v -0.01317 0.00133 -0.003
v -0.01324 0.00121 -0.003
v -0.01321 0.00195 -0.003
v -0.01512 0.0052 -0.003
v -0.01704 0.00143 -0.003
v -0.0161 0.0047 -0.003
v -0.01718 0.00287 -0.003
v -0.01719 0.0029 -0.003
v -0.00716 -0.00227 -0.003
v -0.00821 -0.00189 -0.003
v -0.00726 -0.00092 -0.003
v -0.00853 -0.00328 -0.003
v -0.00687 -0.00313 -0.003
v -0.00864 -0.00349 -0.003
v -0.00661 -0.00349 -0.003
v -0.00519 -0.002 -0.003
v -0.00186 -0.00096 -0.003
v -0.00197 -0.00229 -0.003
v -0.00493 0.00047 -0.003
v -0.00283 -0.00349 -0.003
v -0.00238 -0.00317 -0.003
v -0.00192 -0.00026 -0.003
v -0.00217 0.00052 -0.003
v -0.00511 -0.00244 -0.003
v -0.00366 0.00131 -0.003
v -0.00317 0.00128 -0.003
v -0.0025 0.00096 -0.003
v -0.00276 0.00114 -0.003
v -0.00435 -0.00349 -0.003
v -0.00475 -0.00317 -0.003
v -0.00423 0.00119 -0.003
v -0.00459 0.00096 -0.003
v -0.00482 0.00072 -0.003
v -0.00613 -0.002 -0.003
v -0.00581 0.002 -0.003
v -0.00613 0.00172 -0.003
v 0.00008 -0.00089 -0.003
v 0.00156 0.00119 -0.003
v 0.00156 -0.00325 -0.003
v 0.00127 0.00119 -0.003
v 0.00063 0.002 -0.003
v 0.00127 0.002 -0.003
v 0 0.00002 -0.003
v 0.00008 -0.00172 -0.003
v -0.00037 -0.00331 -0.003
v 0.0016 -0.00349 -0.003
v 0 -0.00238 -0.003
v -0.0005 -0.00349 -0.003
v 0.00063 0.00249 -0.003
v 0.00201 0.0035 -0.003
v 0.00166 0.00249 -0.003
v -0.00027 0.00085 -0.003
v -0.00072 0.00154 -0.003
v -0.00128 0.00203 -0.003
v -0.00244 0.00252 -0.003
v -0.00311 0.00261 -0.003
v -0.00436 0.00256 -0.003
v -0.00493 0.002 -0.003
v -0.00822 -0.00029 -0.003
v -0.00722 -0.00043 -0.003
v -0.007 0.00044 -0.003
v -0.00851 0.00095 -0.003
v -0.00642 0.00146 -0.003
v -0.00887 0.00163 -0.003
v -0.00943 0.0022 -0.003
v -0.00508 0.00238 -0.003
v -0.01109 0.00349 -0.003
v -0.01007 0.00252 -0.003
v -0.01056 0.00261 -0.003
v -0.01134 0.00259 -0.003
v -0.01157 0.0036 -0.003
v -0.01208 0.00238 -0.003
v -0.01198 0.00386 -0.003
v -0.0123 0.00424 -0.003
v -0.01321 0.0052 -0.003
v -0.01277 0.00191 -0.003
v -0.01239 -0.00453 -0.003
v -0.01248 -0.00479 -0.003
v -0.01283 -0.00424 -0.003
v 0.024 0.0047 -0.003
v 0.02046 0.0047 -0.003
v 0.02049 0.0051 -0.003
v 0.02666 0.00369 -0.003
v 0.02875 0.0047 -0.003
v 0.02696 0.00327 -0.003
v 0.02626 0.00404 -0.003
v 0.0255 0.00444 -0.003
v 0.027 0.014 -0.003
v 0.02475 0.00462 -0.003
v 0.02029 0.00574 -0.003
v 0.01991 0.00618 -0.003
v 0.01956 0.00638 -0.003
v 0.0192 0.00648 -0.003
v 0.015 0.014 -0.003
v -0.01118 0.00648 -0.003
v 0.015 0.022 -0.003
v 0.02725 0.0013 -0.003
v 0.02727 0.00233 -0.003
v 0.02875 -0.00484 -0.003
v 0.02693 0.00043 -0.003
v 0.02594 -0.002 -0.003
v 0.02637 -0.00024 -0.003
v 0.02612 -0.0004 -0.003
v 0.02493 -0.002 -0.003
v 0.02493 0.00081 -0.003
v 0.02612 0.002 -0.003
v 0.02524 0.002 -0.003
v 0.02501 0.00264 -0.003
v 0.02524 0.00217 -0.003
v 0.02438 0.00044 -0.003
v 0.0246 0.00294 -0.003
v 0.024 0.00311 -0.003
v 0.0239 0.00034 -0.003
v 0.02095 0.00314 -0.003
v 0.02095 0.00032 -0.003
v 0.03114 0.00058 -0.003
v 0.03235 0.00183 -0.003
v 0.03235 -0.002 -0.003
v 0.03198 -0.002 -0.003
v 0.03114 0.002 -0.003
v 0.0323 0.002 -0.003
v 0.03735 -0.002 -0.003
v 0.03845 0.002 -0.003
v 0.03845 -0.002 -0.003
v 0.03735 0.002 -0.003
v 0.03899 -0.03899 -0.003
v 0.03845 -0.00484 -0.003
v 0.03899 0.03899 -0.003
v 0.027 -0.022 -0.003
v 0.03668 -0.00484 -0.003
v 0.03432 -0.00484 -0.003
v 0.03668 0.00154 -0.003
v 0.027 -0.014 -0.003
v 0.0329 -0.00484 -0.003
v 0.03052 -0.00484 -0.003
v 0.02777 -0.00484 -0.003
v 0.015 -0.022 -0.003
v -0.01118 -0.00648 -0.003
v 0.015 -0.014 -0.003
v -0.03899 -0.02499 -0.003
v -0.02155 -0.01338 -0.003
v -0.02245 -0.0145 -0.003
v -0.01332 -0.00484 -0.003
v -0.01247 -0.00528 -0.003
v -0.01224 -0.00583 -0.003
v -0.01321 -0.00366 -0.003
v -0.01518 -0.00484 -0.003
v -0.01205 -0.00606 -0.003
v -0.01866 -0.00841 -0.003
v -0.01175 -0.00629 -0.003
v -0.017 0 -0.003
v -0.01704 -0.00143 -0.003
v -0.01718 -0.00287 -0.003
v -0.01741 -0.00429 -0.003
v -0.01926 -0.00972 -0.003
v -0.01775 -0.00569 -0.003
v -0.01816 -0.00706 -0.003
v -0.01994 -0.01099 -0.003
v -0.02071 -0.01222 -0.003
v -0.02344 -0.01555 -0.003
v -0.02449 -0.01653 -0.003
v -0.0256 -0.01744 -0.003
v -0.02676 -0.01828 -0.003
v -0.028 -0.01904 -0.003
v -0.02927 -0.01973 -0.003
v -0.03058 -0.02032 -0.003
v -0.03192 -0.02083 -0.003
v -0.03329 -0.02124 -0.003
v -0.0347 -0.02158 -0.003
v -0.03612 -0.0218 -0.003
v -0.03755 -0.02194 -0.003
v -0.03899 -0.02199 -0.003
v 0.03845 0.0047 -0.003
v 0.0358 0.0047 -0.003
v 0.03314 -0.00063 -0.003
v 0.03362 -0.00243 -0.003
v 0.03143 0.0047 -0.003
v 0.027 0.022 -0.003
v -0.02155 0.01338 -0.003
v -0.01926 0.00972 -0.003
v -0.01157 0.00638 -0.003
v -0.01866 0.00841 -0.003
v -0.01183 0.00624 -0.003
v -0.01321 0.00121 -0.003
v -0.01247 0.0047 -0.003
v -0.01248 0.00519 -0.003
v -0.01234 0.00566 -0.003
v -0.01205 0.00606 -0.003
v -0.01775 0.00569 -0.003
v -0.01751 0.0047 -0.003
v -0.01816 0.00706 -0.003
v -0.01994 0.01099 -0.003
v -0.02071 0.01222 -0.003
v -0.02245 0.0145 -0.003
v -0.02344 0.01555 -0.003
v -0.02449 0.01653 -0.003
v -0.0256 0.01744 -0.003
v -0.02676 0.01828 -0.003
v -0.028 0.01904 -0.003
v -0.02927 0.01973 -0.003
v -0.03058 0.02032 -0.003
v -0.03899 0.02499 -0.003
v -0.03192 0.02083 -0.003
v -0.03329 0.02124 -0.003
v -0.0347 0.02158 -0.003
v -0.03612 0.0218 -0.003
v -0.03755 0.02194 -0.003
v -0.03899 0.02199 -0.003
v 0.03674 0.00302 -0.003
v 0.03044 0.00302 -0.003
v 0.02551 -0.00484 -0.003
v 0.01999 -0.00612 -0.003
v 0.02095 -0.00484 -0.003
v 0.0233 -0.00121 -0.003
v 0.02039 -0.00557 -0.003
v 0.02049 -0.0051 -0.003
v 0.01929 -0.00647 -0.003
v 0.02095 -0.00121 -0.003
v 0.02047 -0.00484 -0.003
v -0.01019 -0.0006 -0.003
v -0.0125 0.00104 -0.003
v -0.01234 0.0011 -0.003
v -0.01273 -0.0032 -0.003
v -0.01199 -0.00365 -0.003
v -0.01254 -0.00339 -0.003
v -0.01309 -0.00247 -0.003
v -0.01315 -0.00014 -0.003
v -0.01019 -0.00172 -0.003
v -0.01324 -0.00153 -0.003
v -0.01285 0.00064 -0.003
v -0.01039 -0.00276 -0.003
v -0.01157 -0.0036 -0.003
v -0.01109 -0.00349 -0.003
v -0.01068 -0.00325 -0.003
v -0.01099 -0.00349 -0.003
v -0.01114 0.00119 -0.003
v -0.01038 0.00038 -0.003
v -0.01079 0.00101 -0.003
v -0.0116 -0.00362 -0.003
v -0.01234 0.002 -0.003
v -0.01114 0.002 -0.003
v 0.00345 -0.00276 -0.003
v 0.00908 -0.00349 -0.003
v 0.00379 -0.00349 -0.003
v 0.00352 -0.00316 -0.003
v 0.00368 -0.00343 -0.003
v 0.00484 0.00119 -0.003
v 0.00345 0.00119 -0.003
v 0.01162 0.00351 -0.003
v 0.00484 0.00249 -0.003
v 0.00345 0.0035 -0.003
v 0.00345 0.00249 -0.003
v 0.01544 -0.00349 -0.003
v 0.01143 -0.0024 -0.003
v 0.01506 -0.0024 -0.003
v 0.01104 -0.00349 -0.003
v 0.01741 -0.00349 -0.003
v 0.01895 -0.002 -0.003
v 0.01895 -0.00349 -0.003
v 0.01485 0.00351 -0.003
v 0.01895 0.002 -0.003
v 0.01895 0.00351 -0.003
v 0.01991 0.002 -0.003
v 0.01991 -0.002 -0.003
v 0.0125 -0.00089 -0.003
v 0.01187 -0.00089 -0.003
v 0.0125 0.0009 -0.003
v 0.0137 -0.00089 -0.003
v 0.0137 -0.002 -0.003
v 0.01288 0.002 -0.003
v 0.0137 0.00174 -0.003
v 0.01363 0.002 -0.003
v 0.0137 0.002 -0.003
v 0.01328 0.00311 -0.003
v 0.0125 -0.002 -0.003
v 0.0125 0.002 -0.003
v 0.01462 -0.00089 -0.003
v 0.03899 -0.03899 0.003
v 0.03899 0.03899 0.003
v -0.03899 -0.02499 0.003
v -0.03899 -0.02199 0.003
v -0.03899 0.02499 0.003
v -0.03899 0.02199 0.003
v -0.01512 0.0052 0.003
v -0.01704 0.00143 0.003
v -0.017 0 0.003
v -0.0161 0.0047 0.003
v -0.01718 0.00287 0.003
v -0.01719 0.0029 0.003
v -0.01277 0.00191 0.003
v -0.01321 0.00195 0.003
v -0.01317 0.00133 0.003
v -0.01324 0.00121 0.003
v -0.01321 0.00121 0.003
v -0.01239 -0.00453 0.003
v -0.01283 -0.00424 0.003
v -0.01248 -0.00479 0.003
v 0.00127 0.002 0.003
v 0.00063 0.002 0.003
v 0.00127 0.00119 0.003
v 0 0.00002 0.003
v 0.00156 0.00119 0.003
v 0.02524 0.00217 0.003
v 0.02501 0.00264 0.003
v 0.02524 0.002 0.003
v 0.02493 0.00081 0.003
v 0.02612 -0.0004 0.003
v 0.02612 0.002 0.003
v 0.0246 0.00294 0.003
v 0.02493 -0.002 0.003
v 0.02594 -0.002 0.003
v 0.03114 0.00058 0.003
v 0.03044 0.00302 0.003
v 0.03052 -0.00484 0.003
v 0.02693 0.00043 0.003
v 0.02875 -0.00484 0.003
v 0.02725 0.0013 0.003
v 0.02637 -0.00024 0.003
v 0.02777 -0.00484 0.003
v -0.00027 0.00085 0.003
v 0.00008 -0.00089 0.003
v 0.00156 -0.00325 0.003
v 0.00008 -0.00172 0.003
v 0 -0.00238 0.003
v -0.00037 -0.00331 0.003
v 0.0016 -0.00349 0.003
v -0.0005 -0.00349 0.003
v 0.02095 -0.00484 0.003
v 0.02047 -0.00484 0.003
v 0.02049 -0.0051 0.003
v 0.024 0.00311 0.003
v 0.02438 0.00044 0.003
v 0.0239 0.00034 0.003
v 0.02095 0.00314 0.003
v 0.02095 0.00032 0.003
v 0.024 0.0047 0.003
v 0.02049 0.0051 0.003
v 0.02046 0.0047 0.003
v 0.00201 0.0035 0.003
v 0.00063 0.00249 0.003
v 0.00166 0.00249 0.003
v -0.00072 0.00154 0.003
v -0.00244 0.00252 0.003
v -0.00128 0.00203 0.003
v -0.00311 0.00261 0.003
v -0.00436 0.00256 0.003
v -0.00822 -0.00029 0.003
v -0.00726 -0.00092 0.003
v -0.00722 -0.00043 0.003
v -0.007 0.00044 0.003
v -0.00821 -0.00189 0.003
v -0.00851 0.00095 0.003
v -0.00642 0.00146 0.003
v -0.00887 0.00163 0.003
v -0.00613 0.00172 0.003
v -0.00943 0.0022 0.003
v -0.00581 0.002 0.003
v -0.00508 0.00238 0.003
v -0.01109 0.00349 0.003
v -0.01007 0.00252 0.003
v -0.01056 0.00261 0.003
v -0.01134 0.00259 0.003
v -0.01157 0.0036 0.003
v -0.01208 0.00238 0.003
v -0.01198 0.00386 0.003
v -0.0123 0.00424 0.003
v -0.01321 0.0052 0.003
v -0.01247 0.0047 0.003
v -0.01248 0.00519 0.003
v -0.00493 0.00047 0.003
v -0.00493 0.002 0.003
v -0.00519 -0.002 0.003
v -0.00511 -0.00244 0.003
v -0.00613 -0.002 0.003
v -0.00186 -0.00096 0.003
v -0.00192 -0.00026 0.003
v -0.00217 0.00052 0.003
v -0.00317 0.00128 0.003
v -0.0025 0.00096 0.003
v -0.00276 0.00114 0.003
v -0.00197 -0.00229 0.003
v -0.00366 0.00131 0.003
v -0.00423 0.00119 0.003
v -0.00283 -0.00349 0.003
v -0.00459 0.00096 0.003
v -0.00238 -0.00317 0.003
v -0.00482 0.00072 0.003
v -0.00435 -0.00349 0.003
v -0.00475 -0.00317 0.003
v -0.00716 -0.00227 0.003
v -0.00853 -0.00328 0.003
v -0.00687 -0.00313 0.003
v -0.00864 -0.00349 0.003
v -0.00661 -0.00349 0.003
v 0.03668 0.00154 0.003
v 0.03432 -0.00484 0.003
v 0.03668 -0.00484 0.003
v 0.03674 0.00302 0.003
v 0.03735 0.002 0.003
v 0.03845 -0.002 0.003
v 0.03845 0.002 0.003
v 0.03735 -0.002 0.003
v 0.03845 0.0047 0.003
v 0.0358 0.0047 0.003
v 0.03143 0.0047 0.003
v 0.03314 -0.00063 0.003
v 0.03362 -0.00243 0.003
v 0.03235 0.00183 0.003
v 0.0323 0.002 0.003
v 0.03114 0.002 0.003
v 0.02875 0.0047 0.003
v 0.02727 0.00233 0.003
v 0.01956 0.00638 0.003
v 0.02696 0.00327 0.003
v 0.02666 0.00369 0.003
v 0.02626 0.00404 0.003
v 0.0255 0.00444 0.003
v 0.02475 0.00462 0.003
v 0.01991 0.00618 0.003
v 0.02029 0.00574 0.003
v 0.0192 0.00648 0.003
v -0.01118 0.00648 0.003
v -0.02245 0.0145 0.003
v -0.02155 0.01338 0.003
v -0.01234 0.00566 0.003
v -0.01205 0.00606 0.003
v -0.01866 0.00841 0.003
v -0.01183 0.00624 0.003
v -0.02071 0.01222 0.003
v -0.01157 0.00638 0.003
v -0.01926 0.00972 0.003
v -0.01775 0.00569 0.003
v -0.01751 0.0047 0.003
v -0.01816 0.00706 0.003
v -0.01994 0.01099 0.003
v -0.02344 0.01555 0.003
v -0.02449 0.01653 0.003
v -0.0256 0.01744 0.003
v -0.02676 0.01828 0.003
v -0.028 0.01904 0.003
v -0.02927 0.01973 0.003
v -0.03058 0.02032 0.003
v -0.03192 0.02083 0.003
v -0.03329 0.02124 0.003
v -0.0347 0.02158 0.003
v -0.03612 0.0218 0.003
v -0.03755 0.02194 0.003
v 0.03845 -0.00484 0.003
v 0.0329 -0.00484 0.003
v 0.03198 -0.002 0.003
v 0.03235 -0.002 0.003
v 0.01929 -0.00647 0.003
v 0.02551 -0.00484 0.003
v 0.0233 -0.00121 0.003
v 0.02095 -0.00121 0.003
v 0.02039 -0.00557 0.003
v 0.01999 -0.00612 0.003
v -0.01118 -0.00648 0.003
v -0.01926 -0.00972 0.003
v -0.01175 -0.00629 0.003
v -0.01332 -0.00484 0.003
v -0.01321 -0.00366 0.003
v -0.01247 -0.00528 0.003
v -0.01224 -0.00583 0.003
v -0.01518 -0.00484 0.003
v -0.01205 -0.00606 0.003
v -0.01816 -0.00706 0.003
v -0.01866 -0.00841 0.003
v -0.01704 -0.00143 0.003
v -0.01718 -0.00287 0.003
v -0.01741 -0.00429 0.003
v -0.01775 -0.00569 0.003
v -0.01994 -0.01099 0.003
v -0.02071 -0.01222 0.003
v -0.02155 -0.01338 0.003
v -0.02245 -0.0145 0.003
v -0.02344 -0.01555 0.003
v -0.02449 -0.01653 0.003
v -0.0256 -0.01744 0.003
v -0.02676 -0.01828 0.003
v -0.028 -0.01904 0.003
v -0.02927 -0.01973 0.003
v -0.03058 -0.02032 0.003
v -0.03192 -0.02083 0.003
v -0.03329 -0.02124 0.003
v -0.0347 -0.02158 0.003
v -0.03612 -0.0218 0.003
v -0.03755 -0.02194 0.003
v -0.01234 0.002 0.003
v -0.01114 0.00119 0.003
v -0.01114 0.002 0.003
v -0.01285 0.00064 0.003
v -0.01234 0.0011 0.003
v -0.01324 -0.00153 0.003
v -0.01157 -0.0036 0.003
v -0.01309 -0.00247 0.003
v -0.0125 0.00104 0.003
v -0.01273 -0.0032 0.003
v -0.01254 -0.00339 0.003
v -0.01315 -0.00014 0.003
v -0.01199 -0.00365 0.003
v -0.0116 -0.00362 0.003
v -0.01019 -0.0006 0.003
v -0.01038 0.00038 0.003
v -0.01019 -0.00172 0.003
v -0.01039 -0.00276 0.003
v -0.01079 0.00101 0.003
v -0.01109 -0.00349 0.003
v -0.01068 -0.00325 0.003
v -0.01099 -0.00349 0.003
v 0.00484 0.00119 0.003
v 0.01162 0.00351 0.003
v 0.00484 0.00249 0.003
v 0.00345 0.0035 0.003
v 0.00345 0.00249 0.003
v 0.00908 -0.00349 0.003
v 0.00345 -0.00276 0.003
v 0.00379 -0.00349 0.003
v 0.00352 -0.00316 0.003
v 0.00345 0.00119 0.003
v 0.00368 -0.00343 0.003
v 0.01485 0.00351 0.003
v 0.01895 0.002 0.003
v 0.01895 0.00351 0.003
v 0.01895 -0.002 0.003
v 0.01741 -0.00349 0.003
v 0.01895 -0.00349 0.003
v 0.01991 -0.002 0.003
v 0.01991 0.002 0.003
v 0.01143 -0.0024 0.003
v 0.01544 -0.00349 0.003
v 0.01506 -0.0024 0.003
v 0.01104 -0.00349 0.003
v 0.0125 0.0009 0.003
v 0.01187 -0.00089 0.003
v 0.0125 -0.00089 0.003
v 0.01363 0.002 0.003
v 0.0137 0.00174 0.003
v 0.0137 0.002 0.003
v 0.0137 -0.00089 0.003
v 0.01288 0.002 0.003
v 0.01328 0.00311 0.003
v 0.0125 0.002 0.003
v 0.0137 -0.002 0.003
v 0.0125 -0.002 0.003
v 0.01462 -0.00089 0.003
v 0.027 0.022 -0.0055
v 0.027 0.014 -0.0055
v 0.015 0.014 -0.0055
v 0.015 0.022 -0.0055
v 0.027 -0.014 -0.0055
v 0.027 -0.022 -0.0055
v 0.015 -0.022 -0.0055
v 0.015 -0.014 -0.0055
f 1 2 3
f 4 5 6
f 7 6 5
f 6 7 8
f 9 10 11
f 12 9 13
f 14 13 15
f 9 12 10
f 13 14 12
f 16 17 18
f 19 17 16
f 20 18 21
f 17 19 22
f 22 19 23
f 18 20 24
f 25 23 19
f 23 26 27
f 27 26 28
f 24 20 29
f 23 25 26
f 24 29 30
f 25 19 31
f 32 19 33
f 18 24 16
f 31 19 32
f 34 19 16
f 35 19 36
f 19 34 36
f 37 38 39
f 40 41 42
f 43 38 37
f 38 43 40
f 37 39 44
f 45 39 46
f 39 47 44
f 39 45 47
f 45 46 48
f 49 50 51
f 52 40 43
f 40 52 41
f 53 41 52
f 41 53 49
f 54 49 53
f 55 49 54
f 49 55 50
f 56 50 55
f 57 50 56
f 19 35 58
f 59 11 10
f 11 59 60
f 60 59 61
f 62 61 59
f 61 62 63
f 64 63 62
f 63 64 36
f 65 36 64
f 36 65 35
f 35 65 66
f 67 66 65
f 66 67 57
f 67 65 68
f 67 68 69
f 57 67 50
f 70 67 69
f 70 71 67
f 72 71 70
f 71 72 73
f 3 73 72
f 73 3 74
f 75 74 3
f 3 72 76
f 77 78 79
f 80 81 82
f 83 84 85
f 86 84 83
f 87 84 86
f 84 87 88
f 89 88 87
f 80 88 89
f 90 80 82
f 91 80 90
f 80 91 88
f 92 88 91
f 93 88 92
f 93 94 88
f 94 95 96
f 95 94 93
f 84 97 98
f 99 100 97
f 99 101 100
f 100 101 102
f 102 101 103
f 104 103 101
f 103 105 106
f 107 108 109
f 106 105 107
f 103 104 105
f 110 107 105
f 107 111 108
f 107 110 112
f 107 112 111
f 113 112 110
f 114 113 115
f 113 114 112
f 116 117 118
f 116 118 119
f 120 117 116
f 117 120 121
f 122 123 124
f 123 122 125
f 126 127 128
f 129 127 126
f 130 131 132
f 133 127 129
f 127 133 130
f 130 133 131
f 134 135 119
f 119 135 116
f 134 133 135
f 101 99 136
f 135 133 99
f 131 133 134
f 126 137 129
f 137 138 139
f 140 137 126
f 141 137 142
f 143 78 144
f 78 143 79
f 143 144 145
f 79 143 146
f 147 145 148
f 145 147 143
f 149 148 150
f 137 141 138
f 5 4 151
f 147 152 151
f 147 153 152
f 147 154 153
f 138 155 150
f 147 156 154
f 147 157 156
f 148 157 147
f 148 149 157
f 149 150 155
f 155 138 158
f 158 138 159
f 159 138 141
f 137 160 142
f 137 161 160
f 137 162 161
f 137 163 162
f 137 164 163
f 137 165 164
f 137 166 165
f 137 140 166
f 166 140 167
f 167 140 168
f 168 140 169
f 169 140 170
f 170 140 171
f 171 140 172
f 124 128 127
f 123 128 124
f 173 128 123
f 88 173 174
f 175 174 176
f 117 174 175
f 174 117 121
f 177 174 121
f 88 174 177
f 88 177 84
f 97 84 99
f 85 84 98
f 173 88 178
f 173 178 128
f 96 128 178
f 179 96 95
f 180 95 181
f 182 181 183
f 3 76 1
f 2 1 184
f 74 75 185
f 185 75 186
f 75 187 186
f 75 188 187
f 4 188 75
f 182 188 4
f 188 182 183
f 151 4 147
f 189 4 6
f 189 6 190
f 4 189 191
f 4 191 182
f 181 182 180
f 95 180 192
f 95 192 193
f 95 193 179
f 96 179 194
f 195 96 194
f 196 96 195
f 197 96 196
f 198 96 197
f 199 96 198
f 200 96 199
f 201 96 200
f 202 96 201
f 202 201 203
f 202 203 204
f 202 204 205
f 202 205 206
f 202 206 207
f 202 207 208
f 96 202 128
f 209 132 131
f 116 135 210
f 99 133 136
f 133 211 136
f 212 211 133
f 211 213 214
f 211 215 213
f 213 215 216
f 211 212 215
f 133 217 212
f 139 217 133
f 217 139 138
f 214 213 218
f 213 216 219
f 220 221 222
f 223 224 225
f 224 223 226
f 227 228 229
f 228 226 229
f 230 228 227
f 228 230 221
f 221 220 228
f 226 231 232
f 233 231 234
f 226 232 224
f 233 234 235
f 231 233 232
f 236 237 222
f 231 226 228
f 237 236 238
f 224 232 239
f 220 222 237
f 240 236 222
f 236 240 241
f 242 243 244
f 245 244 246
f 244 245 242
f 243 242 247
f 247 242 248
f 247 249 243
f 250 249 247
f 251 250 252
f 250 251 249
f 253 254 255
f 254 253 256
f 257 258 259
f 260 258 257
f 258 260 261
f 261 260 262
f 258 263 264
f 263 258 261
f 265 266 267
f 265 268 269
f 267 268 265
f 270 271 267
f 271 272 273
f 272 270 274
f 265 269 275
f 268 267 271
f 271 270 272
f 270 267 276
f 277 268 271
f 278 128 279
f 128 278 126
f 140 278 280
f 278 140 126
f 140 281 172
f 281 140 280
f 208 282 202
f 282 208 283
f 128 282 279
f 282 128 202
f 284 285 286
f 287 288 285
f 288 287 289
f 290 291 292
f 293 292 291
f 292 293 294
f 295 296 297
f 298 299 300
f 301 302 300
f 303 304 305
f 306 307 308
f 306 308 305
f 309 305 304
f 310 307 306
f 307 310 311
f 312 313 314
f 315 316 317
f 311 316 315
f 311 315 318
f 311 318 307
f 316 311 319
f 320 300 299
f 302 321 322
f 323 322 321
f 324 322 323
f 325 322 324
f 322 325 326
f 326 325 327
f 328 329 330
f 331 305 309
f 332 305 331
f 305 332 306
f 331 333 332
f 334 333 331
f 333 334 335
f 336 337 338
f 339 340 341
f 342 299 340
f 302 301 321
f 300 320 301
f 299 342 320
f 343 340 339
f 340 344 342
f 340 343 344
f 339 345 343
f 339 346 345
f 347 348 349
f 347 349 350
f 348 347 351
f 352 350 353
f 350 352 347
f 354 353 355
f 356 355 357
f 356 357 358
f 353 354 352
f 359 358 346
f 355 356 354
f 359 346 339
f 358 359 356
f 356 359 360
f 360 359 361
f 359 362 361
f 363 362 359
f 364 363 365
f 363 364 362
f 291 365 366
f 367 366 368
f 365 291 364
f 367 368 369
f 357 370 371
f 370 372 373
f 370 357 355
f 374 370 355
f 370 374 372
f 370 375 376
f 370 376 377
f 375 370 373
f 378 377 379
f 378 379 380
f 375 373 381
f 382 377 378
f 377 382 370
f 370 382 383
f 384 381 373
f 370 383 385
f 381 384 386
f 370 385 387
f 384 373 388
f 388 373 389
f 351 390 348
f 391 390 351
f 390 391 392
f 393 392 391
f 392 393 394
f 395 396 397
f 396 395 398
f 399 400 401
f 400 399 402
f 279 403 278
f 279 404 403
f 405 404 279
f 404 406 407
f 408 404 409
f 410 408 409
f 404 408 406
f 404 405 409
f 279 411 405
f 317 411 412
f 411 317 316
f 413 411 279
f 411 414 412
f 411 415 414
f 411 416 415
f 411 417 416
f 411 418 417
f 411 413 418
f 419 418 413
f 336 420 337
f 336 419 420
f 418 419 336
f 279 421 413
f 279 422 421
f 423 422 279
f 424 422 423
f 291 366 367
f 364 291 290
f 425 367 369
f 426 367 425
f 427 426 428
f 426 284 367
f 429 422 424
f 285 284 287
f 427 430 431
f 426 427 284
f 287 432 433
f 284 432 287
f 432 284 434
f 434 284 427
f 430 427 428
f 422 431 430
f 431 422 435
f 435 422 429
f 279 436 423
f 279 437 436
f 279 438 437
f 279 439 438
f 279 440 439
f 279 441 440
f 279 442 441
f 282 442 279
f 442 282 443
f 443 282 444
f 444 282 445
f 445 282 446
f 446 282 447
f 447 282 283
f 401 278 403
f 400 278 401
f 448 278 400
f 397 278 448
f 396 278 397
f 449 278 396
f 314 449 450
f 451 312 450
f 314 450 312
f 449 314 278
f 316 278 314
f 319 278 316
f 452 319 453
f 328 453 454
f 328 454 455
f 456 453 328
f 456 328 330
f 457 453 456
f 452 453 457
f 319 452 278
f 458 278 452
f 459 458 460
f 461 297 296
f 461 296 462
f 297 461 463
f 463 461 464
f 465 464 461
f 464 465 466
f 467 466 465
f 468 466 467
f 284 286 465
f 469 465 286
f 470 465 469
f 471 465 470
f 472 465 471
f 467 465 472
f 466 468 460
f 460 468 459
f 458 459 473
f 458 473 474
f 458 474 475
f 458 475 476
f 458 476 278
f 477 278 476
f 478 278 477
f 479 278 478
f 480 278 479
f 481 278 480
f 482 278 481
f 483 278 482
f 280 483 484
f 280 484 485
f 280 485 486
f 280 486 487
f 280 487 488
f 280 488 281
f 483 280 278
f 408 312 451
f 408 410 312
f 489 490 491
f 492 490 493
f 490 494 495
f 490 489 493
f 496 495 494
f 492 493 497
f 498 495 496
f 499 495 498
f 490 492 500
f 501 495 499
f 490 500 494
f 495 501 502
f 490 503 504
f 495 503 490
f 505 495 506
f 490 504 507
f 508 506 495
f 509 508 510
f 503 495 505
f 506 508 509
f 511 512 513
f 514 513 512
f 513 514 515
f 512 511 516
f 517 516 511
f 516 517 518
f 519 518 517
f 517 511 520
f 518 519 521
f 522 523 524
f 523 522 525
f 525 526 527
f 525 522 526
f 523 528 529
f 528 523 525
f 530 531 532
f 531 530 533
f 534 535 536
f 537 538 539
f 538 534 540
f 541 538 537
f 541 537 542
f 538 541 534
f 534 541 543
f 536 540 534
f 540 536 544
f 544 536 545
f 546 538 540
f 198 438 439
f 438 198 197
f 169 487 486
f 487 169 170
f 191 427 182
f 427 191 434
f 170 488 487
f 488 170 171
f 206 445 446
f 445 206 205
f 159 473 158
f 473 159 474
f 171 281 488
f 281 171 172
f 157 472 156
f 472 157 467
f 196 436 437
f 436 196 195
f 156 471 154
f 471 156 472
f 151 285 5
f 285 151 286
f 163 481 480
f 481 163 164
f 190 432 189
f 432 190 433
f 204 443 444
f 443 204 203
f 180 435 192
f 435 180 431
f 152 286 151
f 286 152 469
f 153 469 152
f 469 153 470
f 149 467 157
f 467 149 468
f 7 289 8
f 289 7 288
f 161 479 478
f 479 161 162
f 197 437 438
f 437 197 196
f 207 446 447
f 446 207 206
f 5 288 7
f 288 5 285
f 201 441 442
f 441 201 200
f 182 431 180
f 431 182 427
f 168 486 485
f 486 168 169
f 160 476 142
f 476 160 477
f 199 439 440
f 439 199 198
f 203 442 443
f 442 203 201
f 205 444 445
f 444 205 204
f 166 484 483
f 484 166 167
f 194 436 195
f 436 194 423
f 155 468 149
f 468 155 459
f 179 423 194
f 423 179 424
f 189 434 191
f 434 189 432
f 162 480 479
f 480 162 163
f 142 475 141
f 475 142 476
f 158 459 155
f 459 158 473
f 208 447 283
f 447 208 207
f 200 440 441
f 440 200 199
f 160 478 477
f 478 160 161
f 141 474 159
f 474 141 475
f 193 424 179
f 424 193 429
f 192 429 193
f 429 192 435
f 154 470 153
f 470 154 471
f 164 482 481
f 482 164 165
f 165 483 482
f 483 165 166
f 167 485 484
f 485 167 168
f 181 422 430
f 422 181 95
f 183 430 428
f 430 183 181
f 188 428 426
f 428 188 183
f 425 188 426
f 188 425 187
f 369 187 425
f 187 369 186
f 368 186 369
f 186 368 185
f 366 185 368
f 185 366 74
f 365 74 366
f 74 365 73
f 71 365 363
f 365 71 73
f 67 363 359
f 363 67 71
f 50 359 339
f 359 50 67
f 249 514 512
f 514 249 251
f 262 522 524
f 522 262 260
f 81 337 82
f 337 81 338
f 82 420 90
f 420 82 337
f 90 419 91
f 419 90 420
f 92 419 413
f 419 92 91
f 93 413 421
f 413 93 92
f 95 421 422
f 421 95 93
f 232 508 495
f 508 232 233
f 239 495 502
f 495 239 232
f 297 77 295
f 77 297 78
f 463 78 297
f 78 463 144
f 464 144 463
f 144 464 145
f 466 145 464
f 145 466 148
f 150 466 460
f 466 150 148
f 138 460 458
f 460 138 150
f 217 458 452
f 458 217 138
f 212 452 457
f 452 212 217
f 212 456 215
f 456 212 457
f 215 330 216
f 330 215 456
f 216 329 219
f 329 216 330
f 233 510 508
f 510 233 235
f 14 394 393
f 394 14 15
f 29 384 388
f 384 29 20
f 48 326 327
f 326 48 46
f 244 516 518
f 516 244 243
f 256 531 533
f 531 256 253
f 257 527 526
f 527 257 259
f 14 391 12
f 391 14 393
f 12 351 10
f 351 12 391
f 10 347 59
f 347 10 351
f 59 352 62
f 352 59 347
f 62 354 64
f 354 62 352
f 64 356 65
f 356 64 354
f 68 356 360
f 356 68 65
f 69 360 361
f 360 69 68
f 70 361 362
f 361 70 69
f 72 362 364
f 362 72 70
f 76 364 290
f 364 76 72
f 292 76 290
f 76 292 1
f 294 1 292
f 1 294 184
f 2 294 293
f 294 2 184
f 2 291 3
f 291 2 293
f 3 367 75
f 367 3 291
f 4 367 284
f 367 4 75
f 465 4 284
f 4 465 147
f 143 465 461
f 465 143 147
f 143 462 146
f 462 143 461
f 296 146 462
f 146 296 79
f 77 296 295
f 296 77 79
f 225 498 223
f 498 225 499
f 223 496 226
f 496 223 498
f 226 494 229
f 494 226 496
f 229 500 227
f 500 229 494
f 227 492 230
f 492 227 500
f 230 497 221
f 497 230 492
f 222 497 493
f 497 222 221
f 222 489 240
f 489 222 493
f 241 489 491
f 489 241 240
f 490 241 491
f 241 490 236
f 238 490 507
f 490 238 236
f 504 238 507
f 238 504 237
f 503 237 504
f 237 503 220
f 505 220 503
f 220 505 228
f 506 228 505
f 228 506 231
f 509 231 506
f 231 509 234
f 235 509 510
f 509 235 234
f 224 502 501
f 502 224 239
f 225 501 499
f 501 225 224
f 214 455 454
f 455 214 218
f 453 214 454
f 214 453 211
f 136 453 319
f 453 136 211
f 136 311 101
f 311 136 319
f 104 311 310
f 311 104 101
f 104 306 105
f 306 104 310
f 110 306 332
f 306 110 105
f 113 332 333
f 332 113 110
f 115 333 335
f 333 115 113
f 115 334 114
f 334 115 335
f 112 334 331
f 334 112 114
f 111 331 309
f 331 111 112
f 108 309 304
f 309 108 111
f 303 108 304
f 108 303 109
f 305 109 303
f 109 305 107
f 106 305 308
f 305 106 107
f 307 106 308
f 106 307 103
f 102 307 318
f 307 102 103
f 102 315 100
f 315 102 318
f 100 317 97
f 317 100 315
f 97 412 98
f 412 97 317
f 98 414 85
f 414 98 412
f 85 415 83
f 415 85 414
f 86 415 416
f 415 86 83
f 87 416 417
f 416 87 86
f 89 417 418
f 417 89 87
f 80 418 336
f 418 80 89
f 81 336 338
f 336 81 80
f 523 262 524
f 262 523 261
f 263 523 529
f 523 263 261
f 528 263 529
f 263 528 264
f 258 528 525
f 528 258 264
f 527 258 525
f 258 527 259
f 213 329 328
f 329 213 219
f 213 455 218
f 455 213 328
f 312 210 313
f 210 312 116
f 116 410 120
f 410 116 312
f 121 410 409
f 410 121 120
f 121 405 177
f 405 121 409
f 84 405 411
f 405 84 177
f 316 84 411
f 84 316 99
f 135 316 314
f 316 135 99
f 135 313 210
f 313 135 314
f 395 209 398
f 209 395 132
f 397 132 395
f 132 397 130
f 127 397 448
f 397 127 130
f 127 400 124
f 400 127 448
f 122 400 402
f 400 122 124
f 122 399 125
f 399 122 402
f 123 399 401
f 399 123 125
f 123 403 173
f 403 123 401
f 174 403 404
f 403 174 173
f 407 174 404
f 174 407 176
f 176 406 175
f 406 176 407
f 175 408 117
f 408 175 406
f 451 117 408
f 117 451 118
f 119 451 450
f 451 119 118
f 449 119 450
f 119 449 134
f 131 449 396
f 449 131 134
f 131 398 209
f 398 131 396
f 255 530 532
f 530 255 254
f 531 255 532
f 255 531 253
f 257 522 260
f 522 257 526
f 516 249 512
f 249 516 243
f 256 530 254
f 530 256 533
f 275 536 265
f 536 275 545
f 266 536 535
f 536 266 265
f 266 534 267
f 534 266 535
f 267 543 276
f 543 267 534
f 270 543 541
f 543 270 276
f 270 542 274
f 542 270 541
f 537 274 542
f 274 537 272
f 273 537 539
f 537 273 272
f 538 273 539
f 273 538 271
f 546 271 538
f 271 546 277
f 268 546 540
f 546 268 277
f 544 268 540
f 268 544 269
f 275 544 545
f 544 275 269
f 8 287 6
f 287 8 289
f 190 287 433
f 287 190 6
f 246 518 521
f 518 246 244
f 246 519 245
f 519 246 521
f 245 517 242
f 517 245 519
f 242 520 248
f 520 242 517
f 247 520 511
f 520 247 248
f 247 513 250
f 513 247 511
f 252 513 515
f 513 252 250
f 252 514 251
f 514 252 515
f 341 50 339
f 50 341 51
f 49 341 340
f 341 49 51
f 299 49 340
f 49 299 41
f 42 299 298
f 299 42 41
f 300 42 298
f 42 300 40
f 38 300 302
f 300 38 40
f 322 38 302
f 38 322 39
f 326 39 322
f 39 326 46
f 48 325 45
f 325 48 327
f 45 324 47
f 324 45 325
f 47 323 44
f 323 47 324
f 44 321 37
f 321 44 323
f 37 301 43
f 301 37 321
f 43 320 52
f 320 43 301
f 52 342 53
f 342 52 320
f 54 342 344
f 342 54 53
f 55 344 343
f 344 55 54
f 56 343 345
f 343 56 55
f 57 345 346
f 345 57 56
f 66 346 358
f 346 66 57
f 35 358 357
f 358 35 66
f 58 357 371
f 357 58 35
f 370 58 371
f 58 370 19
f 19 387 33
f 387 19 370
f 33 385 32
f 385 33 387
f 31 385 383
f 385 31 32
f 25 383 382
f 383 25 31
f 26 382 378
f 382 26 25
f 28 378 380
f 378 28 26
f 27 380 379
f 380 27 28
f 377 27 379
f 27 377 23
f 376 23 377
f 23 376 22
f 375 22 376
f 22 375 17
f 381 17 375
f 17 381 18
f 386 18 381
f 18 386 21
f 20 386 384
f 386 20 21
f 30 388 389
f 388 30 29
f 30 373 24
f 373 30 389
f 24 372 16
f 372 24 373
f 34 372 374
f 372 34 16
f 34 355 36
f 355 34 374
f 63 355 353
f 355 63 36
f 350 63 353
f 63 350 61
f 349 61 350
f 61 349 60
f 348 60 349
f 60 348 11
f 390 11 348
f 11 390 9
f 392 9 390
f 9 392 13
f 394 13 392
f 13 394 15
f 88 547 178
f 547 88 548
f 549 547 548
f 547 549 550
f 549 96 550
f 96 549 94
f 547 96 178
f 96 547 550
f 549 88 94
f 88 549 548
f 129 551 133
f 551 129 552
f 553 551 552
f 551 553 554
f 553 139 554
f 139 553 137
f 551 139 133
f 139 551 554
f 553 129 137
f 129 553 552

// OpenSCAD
// Thin tapered ID/mounting plate with concave semicircular cutout, 4 through-slots,
// stencil-style cut-through text "EEZYbot ARM MK2", and TWO underside mounting feet.
// Structural fixes applied:
// - Slots are guaranteed to be inside the plate (and not inside the cutout) by computing
//   the local plate half-width at the slot X positions and clamping Y positions.
// - Two underside feet are created and forced to intersect the plate with overlap.
// - All translate() values are derived from dimensions (no arbitrary offsets).

$fn = 96;

// -------------------- Parameters (mm-ish units; keep small as provided) --------------------
plate_L        = 0.078;
plate_W_wide   = 0.078;
plate_W_narrow = 0.050;
plate_t        = 0.006;

cutout_r = 0.022;                 // concave semicircle radius at the narrow end

slot_L = 0.018;
slot_W = 0.003;
slot_pair_spacing = 0.010;        // spacing between the two slot rows (Y)
slot_edge_margin  = 0.006;        // keep slots away from cutout opening
slot_col_spacing  = 0.012;        // separation between the two columns (X)
slot_y_margin     = 0.002;        // keep slots away from plate edges

foot_L = 0.012;
foot_W = 0.008;
foot_drop = 0.004;
foot_from_cutout_end = 0.060;     // from cutout end along +X
foot_lateral_offset = 0.018;

overlap = 0.0015;                 // small overlap to guarantee connectivity

// Text (cut-through)
text_str = "EEZYbot ARM MK2";
text_size = 0.010;
text_spacing = 1.0;
text_font = "Liberation Sans:style=Bold";
text_y_offset = 0;
text_x_offset = 0.010;

// Stencil bridges
bridge_w = 0.0012;
bridge_h = 0.0040;
bridge_count = 14;

// -------------------- Helpers --------------------
function clamp(v, lo, hi) = (v < lo) ? lo : (v > hi) ? hi : v;

// Linear taper: half-width at a given x along the plate
function plate_halfW_at_x(x) =
    let(t = (x + plate_L/2) / plate_L)  // 0 at narrow end (-L/2), 1 at wide end (+L/2)
    (plate_W_narrow/2) + t * ((plate_W_wide - plate_W_narrow)/2);

module tapered_plate_2d() {
    polygon(points = [
        [-plate_L/2, -plate_W_narrow/2],
        [-plate_L/2,  plate_W_narrow/2],
        [ plate_L/2,  plate_W_wide/2],
        [ plate_L/2, -plate_W_wide/2]
    ]);
}

// Concave semicircular cutout that opens into the plate from the narrow end.
module concave_semicircular_end_cutout_2d() {
    end_x = -plate_L/2;
    cx = end_x; // center on the end line for a clean semicircle opening

    intersection() {
        translate([cx, 0]) circle(r = cutout_r);
        // Keep x >= end_x portion of the circle (the part overlapping the plate)
        translate([end_x - overlap, -2*cutout_r])
            square([2*cutout_r + 4*overlap, 4*cutout_r], center=false);
    }
}

module rounded_slot_2d(cx, cy, L, W) {
    r = max(W/2, 0.0001);
    hull() {
        translate([cx - L/2, cy]) circle(r = r);
        translate([cx + L/2, cy]) circle(r = r);
    }
}

module all_slots_2d() {
    end_x = -plate_L/2;

    // Place slots just past the cutout opening, clearly within the plate
    x1 = end_x + cutout_r + slot_edge_margin + slot_L/2;
    x2 = x1 + slot_col_spacing;

    // Compute safe Y positions based on local plate width at each column X
    // so slots cannot end up outside the tapered outline.
    y_lim1 = plate_halfW_at_x(x1) - (slot_W/2) - slot_y_margin;
    y_lim2 = plate_halfW_at_x(x2) - (slot_W/2) - slot_y_margin;

    // Desired pair positions, then clamped to fit both columns
    y_des = slot_pair_spacing/2;
    y1 = clamp( y_des, 0, min(y_lim1, y_lim2));
    y2 = -y1;

    union() {
        rounded_slot_2d(x1, y1, slot_L, slot_W);
        rounded_slot_2d(x2, y1, slot_L, slot_W);
        rounded_slot_2d(x1, y2, slot_L, slot_W);
        rounded_slot_2d(x2, y2, slot_L, slot_W);
    }
}

module stencil_text_minus_bridges_2d() {
    approx_w = max(text_size * len(text_str) * 0.58, text_size*2);
    x_min = -approx_w/2 + text_x_offset;

    difference() {
        translate([text_x_offset, text_y_offset])
            text(text_str, size=text_size, font=text_font, spacing=text_spacing,
                 halign="center", valign="center");

        for (i = [0:bridge_count-1]) {
            xi = x_min + (i + 0.5) * (approx_w / bridge_count);
            translate([xi, text_y_offset])
                square([bridge_w, bridge_h], center=true);
        }
    }
}

module plate_solid() {
    difference() {
        linear_extrude(height = plate_t, center = true, convexity=10)
            tapered_plate_2d();

        // Concave semicircular bite (horn corners)
        linear_extrude(height = plate_t + 2*overlap, center = true, convexity=10)
            concave_semicircular_end_cutout_2d();

        // Four through-slots near cutout end
        linear_extrude(height = plate_t + 2*overlap, center = true, convexity=10)
            all_slots_2d();

        // Cut-through stencil text
        linear_extrude(height = plate_t + 2*overlap, center = true, convexity=10)
            stencil_text_minus_bridges_2d();
    }
}

module underside_foot(x, y) {
    // Intersect the plate by 'overlap' to guarantee a single connected solid
    translate([x, y, -(plate_t/2 + foot_drop/2) + overlap])
        cube([foot_L, foot_W, foot_drop], center=true);
}

module final_plate_with_feet() {
    end_x = -plate_L/2;
    foot_x = end_x + foot_from_cutout_end;

    // Ensure feet are within the local plate width at foot_x
    y_lim = plate_halfW_at_x(foot_x) - foot_W/2 - overlap;
    foot_y = clamp(foot_lateral_offset, 0, y_lim);

    union() {
        plate_solid();

        // TWO feet/tabs (symmetrical), both connected
        underside_foot(foot_x,  foot_y);
        underside_foot(foot_x, -foot_y);
    }
}

// Render
color("Silver") final_plate_with_feet();
